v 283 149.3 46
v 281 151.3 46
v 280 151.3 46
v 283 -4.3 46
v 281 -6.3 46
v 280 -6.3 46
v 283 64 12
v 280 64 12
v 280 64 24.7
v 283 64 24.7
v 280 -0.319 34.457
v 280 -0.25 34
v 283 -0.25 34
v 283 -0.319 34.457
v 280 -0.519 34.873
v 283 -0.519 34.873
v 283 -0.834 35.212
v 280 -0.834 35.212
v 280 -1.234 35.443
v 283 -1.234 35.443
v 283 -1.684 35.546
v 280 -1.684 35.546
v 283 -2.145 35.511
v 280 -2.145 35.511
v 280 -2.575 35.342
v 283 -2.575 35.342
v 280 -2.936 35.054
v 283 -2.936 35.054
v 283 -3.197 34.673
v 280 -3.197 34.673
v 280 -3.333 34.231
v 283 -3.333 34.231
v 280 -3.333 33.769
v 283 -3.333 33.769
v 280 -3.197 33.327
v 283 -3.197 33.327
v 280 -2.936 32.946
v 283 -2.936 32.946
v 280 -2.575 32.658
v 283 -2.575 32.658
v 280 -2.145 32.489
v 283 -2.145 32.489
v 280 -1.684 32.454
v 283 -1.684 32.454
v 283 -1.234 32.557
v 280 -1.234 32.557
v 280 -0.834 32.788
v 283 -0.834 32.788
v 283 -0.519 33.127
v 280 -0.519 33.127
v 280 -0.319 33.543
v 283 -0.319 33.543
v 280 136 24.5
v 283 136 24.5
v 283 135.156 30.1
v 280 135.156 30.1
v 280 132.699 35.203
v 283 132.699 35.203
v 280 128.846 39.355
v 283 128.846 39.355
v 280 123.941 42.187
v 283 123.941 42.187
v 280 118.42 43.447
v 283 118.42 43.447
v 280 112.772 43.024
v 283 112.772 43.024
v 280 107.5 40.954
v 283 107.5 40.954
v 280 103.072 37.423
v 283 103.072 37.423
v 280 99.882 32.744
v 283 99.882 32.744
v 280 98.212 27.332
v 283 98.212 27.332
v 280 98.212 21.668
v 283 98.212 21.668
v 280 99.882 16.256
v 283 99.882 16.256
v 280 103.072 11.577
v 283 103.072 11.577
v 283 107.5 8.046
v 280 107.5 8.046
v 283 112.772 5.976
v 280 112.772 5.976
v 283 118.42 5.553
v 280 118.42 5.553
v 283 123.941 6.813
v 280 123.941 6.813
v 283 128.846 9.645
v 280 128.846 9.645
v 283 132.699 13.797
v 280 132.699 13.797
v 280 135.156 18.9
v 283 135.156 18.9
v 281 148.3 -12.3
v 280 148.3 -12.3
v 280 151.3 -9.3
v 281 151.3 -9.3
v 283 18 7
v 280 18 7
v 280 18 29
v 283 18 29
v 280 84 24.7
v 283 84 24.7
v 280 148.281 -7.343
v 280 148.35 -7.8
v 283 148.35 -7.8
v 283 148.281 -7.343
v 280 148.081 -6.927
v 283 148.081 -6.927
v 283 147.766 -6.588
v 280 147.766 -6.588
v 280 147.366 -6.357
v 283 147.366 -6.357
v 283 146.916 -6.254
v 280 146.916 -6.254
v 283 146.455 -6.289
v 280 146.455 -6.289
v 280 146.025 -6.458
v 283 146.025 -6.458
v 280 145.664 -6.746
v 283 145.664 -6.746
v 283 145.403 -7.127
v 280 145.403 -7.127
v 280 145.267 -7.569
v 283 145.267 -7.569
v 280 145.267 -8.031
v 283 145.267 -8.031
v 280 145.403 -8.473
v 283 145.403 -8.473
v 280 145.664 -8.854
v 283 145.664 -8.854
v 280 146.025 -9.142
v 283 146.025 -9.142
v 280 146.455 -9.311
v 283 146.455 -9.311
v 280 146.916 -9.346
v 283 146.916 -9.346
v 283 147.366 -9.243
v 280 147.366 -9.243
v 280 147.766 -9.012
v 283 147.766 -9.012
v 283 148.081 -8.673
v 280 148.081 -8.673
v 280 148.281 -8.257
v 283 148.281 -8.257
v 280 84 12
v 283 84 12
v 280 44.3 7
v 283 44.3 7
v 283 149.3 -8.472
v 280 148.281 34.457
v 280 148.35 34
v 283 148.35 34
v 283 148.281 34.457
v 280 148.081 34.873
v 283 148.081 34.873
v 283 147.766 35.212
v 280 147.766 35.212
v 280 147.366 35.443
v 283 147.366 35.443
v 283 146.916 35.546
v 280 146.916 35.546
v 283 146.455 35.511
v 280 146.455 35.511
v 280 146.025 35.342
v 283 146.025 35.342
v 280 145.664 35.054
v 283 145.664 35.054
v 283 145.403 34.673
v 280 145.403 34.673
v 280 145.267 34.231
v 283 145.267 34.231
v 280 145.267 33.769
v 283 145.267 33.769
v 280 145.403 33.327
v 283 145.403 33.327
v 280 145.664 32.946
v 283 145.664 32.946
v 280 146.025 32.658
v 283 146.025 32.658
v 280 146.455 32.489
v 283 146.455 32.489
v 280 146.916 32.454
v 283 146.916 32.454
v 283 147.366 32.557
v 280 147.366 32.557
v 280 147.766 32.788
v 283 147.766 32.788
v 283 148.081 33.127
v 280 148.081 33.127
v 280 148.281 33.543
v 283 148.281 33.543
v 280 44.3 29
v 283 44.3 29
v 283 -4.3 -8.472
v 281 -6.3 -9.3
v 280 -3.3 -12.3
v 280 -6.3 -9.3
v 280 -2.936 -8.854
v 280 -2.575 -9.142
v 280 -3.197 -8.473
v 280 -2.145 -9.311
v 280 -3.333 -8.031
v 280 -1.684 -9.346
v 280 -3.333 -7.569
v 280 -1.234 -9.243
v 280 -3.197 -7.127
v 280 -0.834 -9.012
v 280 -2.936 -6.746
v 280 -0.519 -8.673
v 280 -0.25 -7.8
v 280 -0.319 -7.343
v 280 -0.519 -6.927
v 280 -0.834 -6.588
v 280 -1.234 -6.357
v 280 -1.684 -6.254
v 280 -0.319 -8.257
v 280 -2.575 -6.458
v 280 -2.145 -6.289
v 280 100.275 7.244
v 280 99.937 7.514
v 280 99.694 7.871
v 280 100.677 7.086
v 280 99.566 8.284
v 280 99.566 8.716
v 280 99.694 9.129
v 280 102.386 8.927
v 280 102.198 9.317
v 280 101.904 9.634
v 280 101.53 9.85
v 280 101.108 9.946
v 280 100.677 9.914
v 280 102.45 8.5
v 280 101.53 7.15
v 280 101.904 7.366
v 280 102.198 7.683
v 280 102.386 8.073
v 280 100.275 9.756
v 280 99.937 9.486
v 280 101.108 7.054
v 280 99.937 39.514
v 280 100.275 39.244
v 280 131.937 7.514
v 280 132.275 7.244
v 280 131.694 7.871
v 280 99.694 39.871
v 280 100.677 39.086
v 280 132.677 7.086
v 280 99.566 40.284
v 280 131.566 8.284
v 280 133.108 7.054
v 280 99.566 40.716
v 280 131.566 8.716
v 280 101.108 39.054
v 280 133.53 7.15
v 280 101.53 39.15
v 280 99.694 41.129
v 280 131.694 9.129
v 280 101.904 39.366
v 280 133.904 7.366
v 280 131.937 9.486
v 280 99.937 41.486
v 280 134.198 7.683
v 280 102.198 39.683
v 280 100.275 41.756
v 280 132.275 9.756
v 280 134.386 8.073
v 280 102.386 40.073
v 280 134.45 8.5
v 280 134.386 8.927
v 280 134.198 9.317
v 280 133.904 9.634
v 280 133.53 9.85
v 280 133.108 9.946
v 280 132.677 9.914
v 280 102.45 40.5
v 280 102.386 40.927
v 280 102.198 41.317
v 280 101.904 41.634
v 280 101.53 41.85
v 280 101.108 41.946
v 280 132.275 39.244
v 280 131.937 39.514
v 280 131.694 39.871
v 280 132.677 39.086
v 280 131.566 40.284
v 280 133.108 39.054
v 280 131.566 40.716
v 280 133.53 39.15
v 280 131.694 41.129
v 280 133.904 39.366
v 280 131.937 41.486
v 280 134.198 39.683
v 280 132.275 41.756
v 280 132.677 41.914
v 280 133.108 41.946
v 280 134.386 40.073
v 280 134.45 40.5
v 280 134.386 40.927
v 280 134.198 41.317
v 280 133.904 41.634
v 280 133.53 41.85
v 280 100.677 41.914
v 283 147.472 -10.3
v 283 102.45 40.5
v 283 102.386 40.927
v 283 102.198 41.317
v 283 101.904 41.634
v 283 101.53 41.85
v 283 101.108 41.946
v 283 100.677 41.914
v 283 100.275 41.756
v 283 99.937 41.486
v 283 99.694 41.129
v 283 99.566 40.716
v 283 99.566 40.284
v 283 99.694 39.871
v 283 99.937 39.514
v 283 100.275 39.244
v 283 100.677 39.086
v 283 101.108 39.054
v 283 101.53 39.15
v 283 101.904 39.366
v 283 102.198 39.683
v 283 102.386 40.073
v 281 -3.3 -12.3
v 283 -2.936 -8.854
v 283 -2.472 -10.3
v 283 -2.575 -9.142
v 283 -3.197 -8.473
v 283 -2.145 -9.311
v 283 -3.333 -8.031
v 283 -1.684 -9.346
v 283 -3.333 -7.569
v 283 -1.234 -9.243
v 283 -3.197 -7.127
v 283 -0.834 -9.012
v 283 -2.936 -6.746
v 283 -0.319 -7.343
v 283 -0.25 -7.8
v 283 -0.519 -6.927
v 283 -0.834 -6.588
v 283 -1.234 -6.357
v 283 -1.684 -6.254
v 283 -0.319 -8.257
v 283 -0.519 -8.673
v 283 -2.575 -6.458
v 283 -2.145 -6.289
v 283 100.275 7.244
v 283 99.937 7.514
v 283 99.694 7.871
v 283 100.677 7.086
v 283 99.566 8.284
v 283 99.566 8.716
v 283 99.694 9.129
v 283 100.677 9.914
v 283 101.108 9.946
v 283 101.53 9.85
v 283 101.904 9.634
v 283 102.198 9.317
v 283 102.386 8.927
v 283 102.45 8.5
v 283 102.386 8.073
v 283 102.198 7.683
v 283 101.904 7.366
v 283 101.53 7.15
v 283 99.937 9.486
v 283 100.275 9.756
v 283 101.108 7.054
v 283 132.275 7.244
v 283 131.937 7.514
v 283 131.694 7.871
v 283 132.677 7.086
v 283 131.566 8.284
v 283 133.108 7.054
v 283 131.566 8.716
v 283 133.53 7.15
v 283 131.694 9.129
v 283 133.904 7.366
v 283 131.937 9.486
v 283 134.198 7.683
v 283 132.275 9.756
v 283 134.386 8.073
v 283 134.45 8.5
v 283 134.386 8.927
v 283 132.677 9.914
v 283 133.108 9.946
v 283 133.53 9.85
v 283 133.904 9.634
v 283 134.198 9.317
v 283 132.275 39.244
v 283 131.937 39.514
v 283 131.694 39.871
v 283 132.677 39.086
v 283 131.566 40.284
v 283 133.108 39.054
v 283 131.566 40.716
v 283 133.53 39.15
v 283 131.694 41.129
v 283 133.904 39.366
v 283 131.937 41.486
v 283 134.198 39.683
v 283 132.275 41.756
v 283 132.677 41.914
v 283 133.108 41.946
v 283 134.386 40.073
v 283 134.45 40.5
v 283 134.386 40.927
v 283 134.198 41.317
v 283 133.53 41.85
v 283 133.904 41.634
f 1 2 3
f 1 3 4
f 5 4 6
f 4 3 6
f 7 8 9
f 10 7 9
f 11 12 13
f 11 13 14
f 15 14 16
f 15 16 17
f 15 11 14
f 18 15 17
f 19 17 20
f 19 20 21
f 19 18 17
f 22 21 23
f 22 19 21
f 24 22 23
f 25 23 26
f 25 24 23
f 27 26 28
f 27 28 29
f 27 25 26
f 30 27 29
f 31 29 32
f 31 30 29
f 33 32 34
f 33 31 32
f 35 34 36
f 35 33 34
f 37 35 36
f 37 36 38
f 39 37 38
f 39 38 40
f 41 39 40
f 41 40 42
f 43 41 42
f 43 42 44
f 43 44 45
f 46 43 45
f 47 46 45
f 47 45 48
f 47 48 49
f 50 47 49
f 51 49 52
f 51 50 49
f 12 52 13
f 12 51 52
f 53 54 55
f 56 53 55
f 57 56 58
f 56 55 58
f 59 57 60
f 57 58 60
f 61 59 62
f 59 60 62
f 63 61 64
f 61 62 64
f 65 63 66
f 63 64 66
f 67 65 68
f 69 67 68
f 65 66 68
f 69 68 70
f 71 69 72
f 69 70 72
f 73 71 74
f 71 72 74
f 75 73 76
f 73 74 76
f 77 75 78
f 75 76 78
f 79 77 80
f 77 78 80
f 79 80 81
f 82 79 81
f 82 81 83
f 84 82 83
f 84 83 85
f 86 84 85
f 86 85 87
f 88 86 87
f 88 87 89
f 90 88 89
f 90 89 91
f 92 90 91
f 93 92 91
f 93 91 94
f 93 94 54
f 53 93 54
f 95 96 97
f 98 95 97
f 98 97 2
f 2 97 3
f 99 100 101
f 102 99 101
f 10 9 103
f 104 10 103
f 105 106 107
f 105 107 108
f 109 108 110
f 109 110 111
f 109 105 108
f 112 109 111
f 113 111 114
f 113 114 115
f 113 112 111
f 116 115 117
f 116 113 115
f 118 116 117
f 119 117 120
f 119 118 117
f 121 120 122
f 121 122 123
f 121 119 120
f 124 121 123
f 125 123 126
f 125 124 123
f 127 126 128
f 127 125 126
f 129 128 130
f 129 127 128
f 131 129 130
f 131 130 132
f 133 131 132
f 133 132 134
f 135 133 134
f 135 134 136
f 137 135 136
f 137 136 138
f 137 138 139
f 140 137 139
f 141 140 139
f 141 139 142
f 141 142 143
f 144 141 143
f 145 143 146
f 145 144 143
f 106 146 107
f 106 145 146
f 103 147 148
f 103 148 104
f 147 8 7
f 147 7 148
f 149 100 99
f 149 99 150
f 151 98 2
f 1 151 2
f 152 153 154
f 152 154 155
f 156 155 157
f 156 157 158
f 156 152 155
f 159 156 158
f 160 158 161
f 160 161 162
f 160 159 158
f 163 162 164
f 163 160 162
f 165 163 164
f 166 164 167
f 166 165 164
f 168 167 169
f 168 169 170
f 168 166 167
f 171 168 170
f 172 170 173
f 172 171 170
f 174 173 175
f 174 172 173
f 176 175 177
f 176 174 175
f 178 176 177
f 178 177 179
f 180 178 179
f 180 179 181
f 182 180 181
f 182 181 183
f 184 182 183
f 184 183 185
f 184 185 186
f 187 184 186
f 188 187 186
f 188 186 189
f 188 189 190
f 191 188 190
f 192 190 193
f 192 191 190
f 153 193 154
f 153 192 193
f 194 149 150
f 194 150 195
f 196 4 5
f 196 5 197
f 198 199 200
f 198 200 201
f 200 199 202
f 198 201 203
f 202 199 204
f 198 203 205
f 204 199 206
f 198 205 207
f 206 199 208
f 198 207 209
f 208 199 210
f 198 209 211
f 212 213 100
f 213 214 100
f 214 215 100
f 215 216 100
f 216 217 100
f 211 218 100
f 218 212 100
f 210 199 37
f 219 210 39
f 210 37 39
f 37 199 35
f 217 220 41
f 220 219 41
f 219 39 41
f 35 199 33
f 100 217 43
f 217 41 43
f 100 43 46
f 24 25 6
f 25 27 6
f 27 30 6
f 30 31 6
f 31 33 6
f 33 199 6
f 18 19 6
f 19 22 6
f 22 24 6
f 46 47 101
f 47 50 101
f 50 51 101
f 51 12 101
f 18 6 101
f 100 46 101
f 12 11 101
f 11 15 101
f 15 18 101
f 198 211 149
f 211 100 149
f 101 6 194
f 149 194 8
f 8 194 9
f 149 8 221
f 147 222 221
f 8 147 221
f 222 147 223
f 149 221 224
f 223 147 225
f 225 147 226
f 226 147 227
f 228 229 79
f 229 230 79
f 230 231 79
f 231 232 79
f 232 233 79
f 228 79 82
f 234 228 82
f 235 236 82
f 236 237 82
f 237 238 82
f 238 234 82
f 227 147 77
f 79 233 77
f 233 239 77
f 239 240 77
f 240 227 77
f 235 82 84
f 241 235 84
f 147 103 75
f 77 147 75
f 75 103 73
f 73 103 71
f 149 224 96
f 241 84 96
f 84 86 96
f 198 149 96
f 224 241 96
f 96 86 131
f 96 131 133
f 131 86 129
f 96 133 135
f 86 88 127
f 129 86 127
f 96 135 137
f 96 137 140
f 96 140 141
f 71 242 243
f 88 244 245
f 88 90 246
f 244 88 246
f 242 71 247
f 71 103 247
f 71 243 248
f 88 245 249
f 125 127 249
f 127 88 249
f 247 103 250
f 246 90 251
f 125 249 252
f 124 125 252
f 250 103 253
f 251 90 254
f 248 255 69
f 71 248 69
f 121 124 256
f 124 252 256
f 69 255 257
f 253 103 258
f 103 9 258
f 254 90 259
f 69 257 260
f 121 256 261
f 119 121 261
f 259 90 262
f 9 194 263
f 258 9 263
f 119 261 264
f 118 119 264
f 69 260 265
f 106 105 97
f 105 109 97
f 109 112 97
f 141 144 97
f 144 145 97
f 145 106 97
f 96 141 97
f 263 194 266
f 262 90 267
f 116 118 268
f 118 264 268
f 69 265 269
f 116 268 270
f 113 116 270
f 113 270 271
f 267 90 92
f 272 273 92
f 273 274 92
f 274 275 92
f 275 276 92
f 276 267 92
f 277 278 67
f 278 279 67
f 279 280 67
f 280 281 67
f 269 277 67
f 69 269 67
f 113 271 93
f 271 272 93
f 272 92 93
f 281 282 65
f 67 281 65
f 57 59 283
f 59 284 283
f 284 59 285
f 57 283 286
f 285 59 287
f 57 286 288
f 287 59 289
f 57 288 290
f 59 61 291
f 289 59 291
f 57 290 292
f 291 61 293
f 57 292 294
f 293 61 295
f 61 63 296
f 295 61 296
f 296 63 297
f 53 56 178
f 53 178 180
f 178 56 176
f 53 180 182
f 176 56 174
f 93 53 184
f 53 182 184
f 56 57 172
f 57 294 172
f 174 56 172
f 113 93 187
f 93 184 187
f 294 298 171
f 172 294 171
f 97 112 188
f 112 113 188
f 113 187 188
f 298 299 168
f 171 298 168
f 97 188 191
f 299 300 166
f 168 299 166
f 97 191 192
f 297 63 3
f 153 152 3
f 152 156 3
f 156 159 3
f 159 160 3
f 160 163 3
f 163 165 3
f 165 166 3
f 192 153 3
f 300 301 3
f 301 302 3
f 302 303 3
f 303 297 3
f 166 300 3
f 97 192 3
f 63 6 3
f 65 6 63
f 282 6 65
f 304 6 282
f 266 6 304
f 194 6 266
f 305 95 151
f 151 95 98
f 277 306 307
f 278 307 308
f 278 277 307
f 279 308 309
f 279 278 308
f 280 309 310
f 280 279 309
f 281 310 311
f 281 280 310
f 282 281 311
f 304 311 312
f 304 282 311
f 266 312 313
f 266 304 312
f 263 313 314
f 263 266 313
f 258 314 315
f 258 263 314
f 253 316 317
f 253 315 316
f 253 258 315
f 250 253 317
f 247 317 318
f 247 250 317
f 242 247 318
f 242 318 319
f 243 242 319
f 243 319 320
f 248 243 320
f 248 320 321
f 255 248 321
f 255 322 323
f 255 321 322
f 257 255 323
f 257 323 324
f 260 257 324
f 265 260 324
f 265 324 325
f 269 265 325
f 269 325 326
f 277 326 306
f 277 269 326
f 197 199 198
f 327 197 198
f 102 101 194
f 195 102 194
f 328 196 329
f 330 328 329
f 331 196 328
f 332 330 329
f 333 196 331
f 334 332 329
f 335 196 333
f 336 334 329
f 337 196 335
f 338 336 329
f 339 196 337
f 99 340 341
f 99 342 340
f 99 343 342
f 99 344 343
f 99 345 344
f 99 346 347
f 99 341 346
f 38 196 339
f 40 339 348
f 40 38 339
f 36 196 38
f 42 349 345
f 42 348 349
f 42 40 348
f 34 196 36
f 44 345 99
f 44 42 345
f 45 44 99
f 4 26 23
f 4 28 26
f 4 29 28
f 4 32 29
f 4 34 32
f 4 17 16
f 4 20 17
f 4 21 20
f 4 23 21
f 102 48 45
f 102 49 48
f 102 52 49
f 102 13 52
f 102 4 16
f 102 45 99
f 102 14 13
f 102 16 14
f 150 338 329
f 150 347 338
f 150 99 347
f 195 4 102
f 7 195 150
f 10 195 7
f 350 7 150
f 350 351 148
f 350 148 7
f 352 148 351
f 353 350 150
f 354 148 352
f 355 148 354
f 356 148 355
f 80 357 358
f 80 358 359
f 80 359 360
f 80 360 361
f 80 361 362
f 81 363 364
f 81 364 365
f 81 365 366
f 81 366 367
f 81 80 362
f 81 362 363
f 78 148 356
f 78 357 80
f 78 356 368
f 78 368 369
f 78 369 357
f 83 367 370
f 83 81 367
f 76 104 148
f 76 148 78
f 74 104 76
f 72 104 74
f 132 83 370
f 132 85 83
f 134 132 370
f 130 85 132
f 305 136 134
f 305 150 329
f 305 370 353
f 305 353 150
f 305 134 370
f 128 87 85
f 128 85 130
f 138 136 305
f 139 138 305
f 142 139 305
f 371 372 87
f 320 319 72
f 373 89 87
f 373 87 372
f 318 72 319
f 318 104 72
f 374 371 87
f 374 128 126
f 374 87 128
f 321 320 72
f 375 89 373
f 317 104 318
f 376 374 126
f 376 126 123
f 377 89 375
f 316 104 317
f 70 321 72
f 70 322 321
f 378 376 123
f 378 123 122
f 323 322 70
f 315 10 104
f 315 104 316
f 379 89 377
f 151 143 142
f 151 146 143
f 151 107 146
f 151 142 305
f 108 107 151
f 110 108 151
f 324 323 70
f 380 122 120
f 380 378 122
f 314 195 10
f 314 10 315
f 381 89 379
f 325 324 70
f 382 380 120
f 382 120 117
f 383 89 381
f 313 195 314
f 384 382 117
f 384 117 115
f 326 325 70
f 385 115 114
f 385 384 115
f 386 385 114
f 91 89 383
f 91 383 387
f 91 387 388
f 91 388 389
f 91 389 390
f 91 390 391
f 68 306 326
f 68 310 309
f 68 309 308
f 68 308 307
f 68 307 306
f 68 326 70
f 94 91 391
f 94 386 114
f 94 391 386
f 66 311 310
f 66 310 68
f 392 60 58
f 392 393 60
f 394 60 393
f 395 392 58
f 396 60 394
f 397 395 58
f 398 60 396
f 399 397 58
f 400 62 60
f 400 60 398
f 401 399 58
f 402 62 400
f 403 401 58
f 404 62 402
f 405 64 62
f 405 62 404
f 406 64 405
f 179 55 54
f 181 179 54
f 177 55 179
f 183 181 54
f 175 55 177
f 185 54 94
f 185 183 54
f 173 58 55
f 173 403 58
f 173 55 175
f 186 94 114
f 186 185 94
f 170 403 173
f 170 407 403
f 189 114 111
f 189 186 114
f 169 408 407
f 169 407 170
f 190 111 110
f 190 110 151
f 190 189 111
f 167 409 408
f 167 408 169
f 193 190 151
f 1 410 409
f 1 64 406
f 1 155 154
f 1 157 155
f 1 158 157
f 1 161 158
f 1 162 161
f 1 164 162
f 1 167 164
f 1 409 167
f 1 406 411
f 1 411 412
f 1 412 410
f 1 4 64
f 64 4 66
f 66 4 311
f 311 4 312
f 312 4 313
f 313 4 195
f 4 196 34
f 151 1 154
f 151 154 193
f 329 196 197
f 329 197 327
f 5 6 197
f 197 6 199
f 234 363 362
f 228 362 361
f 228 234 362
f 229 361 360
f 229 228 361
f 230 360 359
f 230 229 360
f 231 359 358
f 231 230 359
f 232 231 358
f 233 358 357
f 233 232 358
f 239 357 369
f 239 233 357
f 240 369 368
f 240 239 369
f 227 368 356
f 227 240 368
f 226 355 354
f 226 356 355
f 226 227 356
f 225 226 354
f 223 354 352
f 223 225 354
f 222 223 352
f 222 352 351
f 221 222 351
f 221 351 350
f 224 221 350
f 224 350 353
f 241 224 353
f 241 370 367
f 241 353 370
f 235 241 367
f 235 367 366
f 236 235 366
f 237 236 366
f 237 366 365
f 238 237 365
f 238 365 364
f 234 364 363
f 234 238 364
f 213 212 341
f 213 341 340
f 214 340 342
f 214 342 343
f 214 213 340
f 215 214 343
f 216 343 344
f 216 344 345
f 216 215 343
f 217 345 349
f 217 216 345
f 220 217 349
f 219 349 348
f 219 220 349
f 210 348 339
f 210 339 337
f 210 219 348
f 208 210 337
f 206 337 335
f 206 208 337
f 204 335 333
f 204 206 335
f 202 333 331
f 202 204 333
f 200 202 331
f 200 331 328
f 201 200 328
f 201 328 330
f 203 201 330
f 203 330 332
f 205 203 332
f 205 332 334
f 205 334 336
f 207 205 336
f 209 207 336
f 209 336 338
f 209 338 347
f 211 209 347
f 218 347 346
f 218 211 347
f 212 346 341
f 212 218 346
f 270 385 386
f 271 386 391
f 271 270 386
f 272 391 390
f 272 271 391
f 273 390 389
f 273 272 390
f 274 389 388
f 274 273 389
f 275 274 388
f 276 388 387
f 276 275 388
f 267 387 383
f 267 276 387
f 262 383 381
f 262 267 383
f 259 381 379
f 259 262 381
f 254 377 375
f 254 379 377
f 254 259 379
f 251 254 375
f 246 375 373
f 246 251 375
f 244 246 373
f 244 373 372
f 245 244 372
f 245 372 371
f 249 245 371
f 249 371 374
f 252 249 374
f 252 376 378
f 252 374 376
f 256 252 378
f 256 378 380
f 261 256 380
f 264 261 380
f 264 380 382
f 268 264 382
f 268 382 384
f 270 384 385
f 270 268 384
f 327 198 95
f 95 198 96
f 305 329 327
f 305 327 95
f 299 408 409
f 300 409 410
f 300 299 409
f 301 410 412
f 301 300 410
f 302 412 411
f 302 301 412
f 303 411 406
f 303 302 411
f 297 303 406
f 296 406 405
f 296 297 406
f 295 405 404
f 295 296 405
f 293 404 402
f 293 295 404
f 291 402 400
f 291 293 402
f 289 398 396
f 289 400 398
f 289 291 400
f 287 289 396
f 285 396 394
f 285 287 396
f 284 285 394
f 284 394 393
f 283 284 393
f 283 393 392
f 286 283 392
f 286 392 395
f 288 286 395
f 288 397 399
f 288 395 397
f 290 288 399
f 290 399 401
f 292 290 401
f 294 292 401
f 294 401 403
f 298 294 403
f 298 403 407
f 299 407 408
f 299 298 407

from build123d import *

# Parameters (mm, degrees)
SKETCH012_R     = 1.55
PAD006_DEPTH    = 3
SKETCH013_R     = 1.45
SKETCH013_W     = 26.3
SKETCH013_H     = 22
SKETCH013_W_2   = 20
SKETCH013_H_2   = 12.7
POCKET006_DEPTH = 5
SKETCH014_R     = 19
POCKET007_DEPTH = 5
CHAMFER004_SIZE = 2


with BuildPart() as part:
    # Sketch012 (on ShapeBinder) → Pad006 (new body)
    with BuildSketch(Plane.YZ.offset(280)):
        Polygon((-6.3, -9.3), (-3.3, -12.3), (148.3, -12.3), (151.3, -9.3), (151.3, 46), (-6.3, 46), align=None)
        with Locations((-1.8, 34)):
            Circle(SKETCH012_R, mode=Mode.SUBTRACT)
        with Locations((-1.8, -7.8)):
            Circle(SKETCH012_R, mode=Mode.SUBTRACT)
        with Locations((146.8, -7.8)):
            Circle(SKETCH012_R, mode=Mode.SUBTRACT)
        with Locations((146.8, 34)):
            Circle(SKETCH012_R, mode=Mode.SUBTRACT)
    extrude(amount=PAD006_DEPTH)

    # Sketch013 (on ShapeBinder) → Pocket006 (cut)
    with BuildSketch(Plane.YZ.offset(280)):
        with Locations((101, 40.5)):
            Circle(SKETCH013_R)
        with Locations((133, 40.5)):
            Circle(SKETCH013_R)
        with Locations((101, 8.5)):
            Circle(SKETCH013_R)
        with Locations((133, 8.5)):
            Circle(SKETCH013_R)
        with Locations((31.15, 18)):
            Rectangle(SKETCH013_W, SKETCH013_H)
        with Locations((74, 18.35)):
            Rectangle(SKETCH013_W_2, SKETCH013_H_2)
    extrude(amount=POCKET006_DEPTH, mode=Mode.SUBTRACT)

    # Sketch014 (on Face5 of Pocket006) → Pocket007 (cut)
    with BuildSketch(Plane.YZ.offset(283)):
        with Locations((117, 24.5)):
            Circle(SKETCH014_R)
    extrude(amount=-POCKET007_DEPTH, mode=Mode.SUBTRACT)

    # Chamfer004
    chamfer004_edges = [part.edges().sort_by_distance(p)[0] for p in [
        (283, -6.3, 18.35),
        (283, -4.8, -10.8),
        (283, 72.5, -12.3),
        (283, 149.8, -10.8),
        (283, 151.3, 18.35),
    ]]
    chamfer(chamfer004_edges, length=CHAMFER004_SIZE)


solid = part.part
